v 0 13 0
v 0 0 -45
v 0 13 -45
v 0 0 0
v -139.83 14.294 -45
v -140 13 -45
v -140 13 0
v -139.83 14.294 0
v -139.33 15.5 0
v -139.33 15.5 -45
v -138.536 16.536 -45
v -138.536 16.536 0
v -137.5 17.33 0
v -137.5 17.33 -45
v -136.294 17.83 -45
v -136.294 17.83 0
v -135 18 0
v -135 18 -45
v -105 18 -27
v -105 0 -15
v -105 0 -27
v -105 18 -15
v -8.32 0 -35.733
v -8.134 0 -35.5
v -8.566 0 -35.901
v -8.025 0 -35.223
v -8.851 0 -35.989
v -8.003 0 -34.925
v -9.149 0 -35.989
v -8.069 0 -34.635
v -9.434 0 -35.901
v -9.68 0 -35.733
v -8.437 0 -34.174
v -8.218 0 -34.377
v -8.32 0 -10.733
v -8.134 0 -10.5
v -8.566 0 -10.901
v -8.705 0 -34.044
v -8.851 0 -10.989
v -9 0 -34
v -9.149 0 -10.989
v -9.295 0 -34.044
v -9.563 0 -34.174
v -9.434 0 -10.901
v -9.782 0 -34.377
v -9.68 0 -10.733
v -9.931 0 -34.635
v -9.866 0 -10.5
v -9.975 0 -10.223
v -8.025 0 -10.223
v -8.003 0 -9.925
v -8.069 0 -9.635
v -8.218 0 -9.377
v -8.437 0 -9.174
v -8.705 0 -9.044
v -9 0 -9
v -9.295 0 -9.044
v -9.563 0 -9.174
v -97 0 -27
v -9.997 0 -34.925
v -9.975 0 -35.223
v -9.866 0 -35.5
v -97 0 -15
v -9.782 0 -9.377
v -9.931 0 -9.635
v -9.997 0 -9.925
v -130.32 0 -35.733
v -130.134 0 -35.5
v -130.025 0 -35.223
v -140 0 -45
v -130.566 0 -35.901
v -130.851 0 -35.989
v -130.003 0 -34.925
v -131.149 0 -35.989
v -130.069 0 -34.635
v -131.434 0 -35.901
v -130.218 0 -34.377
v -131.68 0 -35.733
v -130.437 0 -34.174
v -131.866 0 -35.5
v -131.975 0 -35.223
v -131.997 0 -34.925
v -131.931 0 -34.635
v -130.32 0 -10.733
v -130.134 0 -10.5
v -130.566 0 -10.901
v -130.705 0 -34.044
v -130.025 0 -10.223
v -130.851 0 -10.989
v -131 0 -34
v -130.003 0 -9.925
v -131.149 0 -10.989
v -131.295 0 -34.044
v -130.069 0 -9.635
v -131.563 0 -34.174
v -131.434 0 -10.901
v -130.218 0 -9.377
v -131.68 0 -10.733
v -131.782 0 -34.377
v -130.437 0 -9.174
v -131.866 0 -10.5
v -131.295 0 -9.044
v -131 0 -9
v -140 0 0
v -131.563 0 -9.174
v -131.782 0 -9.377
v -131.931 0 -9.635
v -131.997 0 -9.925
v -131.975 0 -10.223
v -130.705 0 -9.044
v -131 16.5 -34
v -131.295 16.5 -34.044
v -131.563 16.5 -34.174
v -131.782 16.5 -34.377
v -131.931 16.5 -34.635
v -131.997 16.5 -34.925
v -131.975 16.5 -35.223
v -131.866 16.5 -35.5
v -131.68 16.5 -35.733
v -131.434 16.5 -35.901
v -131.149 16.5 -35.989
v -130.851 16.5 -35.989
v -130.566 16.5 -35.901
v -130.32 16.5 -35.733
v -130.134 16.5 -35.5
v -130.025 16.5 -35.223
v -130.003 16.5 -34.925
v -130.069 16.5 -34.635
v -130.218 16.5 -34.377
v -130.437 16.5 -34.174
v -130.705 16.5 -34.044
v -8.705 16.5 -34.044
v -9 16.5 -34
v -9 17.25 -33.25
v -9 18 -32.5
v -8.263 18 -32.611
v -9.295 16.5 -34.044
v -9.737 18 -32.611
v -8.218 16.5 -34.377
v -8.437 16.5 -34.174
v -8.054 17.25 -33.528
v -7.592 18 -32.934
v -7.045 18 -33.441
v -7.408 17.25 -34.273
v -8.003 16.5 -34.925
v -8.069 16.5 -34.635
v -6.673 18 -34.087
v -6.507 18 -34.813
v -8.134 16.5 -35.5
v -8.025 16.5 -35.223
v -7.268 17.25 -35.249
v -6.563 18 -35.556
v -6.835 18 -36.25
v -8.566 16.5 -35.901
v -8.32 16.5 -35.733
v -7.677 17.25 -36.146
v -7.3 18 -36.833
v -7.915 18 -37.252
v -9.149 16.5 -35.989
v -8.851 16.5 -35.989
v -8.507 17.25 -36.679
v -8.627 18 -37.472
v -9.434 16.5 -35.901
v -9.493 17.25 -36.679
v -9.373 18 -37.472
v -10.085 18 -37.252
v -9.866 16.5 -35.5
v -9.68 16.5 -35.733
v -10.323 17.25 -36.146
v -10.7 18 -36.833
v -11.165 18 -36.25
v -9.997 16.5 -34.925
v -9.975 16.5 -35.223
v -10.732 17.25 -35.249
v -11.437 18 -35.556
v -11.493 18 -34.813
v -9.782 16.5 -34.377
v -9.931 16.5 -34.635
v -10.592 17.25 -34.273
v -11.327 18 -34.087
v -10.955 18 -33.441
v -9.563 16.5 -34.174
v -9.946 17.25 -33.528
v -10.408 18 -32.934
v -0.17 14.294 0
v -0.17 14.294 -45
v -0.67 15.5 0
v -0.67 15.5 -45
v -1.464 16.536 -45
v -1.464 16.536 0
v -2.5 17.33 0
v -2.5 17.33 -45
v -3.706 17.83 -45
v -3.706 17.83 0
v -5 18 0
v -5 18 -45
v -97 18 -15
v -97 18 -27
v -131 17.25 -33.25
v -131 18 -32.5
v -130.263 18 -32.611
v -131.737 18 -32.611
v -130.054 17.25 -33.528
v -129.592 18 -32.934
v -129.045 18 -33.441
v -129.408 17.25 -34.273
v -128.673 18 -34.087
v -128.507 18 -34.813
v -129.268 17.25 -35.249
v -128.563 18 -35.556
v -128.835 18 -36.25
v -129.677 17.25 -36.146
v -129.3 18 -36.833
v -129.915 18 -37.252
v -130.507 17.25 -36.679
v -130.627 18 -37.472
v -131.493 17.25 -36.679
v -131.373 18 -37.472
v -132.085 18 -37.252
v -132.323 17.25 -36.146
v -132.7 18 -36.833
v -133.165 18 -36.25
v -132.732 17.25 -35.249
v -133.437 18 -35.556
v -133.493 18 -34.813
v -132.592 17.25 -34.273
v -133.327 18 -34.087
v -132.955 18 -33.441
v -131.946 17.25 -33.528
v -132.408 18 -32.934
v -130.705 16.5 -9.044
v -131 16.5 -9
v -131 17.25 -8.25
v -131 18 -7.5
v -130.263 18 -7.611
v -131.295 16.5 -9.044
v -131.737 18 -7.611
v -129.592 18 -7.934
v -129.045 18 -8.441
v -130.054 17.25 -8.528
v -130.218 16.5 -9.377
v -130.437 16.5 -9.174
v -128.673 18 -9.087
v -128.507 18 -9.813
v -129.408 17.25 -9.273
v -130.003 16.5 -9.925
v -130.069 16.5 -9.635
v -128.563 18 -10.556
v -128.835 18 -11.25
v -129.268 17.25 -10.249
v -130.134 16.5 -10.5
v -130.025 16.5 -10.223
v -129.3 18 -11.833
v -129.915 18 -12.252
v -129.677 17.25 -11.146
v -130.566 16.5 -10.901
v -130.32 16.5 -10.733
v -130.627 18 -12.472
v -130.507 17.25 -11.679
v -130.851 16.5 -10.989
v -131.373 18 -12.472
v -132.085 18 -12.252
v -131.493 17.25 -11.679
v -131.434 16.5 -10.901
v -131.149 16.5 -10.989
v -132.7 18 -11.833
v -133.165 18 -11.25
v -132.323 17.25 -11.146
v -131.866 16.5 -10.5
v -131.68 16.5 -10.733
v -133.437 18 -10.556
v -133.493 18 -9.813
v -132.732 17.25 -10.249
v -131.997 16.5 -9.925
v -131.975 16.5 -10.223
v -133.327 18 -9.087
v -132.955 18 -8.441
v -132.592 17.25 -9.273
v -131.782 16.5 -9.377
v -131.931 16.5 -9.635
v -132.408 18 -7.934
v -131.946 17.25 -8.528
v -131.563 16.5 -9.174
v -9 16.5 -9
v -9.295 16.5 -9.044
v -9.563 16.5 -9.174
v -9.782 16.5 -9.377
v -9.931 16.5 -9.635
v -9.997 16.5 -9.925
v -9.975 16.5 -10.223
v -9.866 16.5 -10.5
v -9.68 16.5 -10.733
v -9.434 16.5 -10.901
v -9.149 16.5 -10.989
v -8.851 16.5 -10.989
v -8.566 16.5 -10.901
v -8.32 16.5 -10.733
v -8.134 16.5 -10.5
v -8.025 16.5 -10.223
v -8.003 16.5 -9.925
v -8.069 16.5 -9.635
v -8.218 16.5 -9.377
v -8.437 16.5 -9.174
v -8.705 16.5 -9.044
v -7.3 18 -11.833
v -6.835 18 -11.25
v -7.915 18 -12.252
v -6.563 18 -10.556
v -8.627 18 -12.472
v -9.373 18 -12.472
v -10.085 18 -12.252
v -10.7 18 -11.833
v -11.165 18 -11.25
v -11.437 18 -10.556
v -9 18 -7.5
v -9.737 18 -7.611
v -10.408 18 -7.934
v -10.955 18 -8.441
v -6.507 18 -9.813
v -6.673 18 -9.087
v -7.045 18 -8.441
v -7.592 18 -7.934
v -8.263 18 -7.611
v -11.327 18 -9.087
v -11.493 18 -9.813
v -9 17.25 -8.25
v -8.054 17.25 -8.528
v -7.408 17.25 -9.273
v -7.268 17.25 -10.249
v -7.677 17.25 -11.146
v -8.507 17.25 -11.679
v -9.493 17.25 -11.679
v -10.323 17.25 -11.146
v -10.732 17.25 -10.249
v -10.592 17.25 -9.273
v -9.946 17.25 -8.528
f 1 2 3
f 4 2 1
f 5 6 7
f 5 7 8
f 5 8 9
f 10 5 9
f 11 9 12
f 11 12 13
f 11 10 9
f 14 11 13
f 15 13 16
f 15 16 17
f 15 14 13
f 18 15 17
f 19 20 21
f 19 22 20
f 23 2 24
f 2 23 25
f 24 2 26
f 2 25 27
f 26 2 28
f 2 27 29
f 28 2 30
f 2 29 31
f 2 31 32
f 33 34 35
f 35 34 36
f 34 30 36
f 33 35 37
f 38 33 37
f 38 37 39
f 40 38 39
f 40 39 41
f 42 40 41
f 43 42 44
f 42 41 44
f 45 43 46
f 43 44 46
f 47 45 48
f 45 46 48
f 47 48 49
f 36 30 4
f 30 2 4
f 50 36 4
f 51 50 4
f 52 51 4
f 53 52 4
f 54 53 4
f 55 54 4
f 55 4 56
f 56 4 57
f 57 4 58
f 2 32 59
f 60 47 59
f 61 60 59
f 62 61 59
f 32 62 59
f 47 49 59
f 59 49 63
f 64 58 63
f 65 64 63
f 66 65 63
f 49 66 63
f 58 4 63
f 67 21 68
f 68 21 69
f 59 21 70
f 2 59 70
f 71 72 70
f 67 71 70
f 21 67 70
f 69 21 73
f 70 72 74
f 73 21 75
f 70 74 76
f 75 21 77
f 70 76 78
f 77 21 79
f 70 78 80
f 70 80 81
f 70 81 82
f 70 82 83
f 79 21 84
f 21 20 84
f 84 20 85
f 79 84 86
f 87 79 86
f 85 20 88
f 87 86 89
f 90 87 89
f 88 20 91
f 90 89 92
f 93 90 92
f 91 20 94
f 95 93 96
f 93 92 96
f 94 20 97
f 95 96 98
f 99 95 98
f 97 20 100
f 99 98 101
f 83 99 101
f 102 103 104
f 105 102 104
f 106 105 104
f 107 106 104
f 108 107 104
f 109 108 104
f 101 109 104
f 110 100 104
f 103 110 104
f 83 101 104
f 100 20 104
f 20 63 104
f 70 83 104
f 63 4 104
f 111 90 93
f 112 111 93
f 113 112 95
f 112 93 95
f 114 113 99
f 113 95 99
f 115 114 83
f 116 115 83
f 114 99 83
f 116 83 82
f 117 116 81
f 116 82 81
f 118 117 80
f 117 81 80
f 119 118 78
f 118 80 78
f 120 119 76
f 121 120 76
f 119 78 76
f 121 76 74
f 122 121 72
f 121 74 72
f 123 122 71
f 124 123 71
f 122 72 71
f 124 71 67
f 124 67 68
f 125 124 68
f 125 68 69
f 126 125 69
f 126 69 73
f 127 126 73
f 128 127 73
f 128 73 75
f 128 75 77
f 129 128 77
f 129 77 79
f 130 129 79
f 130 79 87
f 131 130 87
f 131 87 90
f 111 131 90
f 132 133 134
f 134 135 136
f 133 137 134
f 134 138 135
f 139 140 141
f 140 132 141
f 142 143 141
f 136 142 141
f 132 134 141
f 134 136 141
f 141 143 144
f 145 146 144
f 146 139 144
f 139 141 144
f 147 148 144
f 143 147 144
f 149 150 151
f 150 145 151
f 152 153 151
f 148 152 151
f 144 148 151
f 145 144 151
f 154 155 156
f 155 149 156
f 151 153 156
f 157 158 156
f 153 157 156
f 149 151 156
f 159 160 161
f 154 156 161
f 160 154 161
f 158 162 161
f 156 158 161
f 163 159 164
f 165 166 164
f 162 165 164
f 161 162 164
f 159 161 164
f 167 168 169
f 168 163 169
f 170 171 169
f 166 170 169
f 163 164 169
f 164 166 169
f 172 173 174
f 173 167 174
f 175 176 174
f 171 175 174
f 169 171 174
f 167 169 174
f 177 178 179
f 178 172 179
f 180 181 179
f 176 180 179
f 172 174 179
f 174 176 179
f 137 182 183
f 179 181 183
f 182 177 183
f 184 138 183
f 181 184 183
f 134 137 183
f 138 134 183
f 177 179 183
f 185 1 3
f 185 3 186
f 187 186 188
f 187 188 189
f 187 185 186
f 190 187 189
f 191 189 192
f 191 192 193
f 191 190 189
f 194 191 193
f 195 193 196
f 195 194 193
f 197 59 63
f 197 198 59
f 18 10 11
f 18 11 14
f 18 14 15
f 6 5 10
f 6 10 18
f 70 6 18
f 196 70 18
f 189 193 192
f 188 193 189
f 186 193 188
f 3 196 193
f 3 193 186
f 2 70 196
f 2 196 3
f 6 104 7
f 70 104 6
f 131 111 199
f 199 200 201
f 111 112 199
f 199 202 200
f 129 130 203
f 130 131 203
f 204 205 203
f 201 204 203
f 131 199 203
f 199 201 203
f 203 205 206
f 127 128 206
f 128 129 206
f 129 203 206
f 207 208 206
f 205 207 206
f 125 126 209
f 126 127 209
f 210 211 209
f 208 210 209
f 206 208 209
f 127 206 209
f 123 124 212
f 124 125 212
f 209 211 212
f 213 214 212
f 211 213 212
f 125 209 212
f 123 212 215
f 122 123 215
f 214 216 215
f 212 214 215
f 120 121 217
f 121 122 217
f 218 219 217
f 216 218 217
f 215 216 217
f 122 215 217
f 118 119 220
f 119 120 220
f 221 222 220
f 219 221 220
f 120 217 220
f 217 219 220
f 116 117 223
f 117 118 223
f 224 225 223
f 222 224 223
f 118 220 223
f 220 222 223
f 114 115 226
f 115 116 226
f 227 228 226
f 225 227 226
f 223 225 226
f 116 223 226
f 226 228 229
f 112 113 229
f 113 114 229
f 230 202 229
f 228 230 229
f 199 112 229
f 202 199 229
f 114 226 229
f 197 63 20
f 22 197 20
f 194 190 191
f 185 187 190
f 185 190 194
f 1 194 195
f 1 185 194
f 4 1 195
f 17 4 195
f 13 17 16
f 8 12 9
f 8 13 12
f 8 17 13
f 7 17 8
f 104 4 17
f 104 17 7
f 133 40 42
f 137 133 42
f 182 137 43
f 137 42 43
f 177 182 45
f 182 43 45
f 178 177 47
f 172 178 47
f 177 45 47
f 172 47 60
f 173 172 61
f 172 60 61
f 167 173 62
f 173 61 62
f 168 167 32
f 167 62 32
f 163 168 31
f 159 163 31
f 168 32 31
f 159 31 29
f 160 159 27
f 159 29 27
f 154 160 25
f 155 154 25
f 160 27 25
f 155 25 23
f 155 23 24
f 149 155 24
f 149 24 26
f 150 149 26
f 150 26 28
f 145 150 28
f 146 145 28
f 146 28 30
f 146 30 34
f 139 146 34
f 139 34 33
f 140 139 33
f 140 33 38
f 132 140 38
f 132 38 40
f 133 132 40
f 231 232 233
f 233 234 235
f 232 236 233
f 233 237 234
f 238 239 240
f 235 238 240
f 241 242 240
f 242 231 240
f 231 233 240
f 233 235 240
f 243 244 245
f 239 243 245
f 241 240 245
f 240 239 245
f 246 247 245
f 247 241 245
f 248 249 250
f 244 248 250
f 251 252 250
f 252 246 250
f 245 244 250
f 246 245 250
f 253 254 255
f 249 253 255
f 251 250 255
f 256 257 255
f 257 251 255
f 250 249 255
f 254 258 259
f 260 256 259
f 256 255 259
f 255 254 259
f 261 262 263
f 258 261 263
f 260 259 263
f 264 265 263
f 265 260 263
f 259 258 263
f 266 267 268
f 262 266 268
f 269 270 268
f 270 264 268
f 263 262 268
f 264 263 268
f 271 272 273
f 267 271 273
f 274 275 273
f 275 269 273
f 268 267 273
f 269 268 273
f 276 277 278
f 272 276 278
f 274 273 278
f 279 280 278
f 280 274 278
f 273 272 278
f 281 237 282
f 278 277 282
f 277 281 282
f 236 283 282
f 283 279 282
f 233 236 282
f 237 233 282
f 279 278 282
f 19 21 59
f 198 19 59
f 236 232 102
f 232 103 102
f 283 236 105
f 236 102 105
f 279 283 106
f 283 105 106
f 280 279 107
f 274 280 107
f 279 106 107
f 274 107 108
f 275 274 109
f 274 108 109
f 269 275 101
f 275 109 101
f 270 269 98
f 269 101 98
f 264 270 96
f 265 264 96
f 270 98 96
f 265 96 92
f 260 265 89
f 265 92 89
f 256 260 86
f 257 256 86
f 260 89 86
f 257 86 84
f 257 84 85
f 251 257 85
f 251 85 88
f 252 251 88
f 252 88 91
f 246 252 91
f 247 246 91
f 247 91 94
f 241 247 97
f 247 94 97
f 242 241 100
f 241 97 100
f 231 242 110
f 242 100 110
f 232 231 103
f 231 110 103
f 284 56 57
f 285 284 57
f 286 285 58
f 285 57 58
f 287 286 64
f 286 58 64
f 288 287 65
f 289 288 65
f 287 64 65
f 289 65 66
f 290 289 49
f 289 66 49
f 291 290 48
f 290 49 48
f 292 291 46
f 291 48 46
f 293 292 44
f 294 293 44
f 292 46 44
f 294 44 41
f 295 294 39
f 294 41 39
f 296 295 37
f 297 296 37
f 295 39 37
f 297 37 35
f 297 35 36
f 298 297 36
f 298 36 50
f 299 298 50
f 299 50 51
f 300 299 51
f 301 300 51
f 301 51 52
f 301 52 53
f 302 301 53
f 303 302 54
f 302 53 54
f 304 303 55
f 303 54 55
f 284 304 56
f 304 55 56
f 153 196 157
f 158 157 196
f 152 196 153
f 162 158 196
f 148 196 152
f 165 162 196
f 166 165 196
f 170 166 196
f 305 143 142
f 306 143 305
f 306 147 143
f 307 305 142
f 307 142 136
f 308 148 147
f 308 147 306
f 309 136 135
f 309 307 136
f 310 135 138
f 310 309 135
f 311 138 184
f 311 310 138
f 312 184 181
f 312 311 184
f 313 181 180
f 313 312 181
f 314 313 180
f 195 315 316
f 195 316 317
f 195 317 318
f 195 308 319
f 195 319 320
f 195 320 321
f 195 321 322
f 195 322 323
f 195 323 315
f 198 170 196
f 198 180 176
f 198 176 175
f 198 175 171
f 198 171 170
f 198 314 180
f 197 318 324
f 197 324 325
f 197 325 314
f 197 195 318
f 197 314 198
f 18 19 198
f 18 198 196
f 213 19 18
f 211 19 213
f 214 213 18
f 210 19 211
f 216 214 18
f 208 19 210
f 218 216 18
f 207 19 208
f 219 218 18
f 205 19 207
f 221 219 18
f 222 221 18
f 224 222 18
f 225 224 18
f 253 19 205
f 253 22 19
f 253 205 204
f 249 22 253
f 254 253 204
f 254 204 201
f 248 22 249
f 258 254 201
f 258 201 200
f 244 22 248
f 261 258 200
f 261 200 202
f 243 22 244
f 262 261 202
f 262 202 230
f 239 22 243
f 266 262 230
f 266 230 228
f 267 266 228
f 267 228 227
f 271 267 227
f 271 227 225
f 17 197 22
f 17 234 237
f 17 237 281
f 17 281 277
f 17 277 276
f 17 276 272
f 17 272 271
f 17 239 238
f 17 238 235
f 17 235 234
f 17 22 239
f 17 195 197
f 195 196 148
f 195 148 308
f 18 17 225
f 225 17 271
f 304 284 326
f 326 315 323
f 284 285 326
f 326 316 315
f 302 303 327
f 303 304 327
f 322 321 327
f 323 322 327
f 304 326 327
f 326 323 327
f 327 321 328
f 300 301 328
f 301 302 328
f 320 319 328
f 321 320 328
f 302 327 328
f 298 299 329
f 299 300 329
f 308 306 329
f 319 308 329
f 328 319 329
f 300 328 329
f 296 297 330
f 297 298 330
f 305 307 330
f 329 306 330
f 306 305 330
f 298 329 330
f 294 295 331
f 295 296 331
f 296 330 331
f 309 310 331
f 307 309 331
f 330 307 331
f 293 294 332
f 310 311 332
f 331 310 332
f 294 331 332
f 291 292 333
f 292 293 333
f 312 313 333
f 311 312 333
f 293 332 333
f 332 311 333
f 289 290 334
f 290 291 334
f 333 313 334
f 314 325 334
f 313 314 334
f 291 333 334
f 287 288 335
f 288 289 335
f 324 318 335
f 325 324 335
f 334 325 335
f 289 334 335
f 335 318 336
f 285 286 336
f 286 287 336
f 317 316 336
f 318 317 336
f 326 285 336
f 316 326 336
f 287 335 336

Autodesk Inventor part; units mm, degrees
ref_plane "YZ Plane" through (0, 0, 0) normal (1, 0, 0) x (0, 1, 0)
ref_plane "XZ Plane" through (0, 0, 0) normal (0, 1, 0) x (-1, 0, 0)
ref_plane "XY Plane" through (0, 0, 0) normal (0, 0, 1) x (1, 0, 0)
sketch "Skizze1" plane through (0, 0, 0) normal (0, 1, 0) x (-1, 0, 0)
  line L0 (0, 0) -> (140, 0)
  line L1 (140, 0) -> (140, -45)
  line L2 (140, -45) -> (0, -45)
  line L3 (0, -45) -> (0, 0)
  dimension "d0" = 140
  dimension "d1" = 45
extrude "Extrusion1" add sketch "Skizze1" along normal blind 18
sketch "Skizze2" plane through (0, 18, 0) normal (0, 1, 0) x (1, 0, 0)
  line L0 (0, 0) -> (0, 45) projected
  line L1 (0, 45) -> (-140, 45) projected
  line L2 (-140, 45) -> (-140, 0) projected
  point P0 (-131, 35)
  point P1 (-131, 10)
  point P2 (-9, 35)
  point P3 (-9, 10)
  dimension "d14" = 10
  dimension "d15" = 25
  dimension "d16" = 10
  dimension "d17" = 25
  dimension "d18" = 9
  dimension "d19" = 9
hole "Bohrung1" at (-131, 18, -35) at (-131, 18, -10) at (-9, 18, -35) at (-9, 18, -10) direction (0, -1, 0) diameter 2 end through all countersink diameter 5 countersink angle 90
fillet "Rundung3" radius 5 2 edges at (0, 18, -22.5) (-140, 18, -22.5)
sketch "Skizze3" plane through (0, 18, 0) normal (0, 1, 0) x (1, 0, 0)
  line L0 (-135, 0) -> (-5, 0) projected
  line L1 (-97, 15) -> (-105, 15)
  line L2 (-105, 15) -> (-105, 27)
  line L3 (-105, 27) -> (-97, 27)
  line L4 (-97, 27) -> (-97, 15)
  line L5 (0, 0) -> (0, 45) projected
  line L6 (-140, 45) -> (-140, 0) projected
  dimension "d32" = 8
  dimension "d33" = 12
  dimension "d34" = 15
  dimension "d36" = 35
extrude "Extrusion2" cut sketch "Skizze3" against normal blind 18
sketch "Skizze4" plane through (-140, 0, 0) normal (0, 0, 1) x (1, 0, 0)
  point P0 (131, 3)
properties part number "Seitenteil_mit_schalter" material "Eiche, weiß"
